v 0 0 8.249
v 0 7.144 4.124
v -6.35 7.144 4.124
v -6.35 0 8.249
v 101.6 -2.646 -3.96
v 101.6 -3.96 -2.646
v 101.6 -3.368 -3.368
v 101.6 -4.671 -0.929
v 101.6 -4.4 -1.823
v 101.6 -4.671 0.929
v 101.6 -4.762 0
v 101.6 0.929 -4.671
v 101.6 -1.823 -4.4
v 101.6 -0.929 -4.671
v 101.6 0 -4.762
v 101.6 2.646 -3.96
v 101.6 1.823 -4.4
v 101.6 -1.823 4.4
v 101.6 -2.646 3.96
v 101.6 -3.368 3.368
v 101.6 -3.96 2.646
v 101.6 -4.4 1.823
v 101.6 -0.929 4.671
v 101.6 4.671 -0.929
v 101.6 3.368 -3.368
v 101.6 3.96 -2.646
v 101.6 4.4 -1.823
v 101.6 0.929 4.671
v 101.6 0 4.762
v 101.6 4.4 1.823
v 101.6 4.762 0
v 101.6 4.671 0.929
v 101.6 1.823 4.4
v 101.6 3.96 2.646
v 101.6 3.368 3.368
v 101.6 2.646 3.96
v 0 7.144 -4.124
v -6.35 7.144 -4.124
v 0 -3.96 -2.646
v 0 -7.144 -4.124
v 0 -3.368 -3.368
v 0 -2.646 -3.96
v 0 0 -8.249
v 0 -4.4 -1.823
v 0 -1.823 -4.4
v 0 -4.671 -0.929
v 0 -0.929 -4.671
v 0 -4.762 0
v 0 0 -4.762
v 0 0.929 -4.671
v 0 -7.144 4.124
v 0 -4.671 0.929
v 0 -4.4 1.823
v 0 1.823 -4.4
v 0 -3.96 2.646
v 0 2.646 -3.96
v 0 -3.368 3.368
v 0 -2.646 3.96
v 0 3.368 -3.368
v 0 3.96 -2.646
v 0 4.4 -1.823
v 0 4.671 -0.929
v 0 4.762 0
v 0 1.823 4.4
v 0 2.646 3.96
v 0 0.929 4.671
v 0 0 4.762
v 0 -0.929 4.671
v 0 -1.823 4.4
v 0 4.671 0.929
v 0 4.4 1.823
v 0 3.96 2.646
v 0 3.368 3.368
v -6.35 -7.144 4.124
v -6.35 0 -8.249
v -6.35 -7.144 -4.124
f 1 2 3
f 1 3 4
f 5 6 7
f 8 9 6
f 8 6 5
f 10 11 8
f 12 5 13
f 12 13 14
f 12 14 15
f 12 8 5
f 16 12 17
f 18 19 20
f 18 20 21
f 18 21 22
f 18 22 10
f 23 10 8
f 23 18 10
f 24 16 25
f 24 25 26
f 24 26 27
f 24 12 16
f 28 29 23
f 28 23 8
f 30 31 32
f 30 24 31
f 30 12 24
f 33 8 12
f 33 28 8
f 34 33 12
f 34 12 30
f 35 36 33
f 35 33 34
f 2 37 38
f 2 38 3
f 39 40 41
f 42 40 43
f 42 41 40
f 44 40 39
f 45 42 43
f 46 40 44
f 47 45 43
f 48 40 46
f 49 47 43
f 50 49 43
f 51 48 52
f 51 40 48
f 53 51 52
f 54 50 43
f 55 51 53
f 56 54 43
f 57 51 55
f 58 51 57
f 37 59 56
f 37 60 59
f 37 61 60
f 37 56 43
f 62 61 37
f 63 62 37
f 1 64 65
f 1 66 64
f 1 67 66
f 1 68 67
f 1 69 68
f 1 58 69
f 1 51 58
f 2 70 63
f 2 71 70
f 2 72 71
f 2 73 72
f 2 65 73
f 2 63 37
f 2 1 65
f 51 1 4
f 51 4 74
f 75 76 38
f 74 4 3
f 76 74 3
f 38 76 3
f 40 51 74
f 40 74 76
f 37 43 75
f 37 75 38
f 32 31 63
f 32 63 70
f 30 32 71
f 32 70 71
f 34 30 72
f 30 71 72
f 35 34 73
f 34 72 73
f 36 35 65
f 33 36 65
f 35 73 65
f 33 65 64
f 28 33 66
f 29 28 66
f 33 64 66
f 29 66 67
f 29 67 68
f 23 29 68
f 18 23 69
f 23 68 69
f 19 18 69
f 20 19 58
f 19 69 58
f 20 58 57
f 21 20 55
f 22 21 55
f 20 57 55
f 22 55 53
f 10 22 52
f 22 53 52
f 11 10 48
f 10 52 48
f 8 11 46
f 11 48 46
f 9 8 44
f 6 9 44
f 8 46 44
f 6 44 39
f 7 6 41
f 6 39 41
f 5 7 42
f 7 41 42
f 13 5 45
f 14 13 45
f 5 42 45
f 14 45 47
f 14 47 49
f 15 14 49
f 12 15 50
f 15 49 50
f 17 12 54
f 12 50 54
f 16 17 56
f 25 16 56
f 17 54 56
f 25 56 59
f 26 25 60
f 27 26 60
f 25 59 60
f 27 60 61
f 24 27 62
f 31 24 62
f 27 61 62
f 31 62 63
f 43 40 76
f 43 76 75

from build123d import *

# Parameters (mm, degrees)
F0_R     = 4.7625
F1_DEPTH = 6.35
F2_DEPTH = 101.6


with BuildPart() as f1:
    # F0 (on Right) → F1 (new body)
    with BuildSketch(Plane.YZ):
        Polygon((7.14375, -4.124446), (7.14375, 4.124446), (0, 8.248892), (-7.14375, 4.124446), (-7.14375, -4.124446), (0, -8.248892), align=None)
        Circle(F0_R, mode=Mode.SUBTRACT)
        Circle(F0_R)
    extrude(amount=-F1_DEPTH)

    # F0 (on Right) → F2 (join)
    with BuildSketch(Plane.YZ):
        Circle(F0_R)
    extrude(amount=F2_DEPTH)


solid = f1.part
